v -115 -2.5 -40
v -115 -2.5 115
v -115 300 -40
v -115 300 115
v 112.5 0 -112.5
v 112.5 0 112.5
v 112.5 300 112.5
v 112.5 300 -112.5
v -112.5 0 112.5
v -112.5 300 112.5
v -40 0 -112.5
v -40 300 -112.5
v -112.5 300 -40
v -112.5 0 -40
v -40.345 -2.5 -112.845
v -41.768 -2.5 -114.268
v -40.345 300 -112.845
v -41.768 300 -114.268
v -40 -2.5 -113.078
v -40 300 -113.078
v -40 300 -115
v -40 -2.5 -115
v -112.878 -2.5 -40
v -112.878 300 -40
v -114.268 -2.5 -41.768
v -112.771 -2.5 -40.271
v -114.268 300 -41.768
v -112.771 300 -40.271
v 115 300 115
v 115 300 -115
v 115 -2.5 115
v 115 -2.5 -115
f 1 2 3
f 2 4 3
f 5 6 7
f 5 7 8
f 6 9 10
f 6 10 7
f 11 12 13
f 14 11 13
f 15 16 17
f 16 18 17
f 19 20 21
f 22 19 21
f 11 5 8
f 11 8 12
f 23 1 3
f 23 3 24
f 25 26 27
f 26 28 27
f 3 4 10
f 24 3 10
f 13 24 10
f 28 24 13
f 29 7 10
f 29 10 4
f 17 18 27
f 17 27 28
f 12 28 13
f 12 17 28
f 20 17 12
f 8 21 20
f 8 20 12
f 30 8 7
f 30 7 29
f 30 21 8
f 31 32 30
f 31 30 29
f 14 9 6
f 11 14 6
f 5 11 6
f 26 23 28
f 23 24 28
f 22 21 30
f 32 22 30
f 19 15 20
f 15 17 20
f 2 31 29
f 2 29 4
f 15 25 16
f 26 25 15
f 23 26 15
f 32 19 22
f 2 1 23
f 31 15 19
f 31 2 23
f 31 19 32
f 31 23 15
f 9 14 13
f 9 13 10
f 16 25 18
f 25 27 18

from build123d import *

# Parameters (mm, degrees)
BOSS_EXTRUDE1_DEPTH = 300
BOSS_EXTRUDE2_DEPTH = 2.5


with BuildPart() as part:
    # Sketch1 → Boss-Extrude1 (new body)
    with BuildSketch(Plane(origin=(0, 0, 0), x_dir=(1, 0, 0), z_dir=(0, 1, 0))):
        Polygon((-41.767766953, 114.267766953), (-114.267766953, 41.767766953), (-112.770991517, 40.270991517), (-112.877581569, 40), (-115, 40), (-115, -115), (115, -115), (115, 115), (-40, 115), (-40, 113.078362506), (-40.344526552, 112.844526552), align=None)
        Polygon((-112.5, -112.5), (112.5, -112.5), (112.5, 112.5), (-40, 112.5), (-112.5, 40), align=None, mode=Mode.SUBTRACT)
    extrude(amount=BOSS_EXTRUDE1_DEPTH)

    # Sketch2 → Boss-Extrude2 (add)
    with BuildSketch(Plane.XZ):
        Polygon((115, -115), (115, 115), (-115, 115), (-115, -40), (-112.877581569, -40), (-112.770991517, -40.270991517), (-114.267766953, -41.767766953), (-41.767766953, -114.267766953), (-40.344526552, -112.844526552), (-40, -113.078362506), (-40, -115), align=None)
    extrude(amount=BOSS_EXTRUDE2_DEPTH)


solid = part.part
